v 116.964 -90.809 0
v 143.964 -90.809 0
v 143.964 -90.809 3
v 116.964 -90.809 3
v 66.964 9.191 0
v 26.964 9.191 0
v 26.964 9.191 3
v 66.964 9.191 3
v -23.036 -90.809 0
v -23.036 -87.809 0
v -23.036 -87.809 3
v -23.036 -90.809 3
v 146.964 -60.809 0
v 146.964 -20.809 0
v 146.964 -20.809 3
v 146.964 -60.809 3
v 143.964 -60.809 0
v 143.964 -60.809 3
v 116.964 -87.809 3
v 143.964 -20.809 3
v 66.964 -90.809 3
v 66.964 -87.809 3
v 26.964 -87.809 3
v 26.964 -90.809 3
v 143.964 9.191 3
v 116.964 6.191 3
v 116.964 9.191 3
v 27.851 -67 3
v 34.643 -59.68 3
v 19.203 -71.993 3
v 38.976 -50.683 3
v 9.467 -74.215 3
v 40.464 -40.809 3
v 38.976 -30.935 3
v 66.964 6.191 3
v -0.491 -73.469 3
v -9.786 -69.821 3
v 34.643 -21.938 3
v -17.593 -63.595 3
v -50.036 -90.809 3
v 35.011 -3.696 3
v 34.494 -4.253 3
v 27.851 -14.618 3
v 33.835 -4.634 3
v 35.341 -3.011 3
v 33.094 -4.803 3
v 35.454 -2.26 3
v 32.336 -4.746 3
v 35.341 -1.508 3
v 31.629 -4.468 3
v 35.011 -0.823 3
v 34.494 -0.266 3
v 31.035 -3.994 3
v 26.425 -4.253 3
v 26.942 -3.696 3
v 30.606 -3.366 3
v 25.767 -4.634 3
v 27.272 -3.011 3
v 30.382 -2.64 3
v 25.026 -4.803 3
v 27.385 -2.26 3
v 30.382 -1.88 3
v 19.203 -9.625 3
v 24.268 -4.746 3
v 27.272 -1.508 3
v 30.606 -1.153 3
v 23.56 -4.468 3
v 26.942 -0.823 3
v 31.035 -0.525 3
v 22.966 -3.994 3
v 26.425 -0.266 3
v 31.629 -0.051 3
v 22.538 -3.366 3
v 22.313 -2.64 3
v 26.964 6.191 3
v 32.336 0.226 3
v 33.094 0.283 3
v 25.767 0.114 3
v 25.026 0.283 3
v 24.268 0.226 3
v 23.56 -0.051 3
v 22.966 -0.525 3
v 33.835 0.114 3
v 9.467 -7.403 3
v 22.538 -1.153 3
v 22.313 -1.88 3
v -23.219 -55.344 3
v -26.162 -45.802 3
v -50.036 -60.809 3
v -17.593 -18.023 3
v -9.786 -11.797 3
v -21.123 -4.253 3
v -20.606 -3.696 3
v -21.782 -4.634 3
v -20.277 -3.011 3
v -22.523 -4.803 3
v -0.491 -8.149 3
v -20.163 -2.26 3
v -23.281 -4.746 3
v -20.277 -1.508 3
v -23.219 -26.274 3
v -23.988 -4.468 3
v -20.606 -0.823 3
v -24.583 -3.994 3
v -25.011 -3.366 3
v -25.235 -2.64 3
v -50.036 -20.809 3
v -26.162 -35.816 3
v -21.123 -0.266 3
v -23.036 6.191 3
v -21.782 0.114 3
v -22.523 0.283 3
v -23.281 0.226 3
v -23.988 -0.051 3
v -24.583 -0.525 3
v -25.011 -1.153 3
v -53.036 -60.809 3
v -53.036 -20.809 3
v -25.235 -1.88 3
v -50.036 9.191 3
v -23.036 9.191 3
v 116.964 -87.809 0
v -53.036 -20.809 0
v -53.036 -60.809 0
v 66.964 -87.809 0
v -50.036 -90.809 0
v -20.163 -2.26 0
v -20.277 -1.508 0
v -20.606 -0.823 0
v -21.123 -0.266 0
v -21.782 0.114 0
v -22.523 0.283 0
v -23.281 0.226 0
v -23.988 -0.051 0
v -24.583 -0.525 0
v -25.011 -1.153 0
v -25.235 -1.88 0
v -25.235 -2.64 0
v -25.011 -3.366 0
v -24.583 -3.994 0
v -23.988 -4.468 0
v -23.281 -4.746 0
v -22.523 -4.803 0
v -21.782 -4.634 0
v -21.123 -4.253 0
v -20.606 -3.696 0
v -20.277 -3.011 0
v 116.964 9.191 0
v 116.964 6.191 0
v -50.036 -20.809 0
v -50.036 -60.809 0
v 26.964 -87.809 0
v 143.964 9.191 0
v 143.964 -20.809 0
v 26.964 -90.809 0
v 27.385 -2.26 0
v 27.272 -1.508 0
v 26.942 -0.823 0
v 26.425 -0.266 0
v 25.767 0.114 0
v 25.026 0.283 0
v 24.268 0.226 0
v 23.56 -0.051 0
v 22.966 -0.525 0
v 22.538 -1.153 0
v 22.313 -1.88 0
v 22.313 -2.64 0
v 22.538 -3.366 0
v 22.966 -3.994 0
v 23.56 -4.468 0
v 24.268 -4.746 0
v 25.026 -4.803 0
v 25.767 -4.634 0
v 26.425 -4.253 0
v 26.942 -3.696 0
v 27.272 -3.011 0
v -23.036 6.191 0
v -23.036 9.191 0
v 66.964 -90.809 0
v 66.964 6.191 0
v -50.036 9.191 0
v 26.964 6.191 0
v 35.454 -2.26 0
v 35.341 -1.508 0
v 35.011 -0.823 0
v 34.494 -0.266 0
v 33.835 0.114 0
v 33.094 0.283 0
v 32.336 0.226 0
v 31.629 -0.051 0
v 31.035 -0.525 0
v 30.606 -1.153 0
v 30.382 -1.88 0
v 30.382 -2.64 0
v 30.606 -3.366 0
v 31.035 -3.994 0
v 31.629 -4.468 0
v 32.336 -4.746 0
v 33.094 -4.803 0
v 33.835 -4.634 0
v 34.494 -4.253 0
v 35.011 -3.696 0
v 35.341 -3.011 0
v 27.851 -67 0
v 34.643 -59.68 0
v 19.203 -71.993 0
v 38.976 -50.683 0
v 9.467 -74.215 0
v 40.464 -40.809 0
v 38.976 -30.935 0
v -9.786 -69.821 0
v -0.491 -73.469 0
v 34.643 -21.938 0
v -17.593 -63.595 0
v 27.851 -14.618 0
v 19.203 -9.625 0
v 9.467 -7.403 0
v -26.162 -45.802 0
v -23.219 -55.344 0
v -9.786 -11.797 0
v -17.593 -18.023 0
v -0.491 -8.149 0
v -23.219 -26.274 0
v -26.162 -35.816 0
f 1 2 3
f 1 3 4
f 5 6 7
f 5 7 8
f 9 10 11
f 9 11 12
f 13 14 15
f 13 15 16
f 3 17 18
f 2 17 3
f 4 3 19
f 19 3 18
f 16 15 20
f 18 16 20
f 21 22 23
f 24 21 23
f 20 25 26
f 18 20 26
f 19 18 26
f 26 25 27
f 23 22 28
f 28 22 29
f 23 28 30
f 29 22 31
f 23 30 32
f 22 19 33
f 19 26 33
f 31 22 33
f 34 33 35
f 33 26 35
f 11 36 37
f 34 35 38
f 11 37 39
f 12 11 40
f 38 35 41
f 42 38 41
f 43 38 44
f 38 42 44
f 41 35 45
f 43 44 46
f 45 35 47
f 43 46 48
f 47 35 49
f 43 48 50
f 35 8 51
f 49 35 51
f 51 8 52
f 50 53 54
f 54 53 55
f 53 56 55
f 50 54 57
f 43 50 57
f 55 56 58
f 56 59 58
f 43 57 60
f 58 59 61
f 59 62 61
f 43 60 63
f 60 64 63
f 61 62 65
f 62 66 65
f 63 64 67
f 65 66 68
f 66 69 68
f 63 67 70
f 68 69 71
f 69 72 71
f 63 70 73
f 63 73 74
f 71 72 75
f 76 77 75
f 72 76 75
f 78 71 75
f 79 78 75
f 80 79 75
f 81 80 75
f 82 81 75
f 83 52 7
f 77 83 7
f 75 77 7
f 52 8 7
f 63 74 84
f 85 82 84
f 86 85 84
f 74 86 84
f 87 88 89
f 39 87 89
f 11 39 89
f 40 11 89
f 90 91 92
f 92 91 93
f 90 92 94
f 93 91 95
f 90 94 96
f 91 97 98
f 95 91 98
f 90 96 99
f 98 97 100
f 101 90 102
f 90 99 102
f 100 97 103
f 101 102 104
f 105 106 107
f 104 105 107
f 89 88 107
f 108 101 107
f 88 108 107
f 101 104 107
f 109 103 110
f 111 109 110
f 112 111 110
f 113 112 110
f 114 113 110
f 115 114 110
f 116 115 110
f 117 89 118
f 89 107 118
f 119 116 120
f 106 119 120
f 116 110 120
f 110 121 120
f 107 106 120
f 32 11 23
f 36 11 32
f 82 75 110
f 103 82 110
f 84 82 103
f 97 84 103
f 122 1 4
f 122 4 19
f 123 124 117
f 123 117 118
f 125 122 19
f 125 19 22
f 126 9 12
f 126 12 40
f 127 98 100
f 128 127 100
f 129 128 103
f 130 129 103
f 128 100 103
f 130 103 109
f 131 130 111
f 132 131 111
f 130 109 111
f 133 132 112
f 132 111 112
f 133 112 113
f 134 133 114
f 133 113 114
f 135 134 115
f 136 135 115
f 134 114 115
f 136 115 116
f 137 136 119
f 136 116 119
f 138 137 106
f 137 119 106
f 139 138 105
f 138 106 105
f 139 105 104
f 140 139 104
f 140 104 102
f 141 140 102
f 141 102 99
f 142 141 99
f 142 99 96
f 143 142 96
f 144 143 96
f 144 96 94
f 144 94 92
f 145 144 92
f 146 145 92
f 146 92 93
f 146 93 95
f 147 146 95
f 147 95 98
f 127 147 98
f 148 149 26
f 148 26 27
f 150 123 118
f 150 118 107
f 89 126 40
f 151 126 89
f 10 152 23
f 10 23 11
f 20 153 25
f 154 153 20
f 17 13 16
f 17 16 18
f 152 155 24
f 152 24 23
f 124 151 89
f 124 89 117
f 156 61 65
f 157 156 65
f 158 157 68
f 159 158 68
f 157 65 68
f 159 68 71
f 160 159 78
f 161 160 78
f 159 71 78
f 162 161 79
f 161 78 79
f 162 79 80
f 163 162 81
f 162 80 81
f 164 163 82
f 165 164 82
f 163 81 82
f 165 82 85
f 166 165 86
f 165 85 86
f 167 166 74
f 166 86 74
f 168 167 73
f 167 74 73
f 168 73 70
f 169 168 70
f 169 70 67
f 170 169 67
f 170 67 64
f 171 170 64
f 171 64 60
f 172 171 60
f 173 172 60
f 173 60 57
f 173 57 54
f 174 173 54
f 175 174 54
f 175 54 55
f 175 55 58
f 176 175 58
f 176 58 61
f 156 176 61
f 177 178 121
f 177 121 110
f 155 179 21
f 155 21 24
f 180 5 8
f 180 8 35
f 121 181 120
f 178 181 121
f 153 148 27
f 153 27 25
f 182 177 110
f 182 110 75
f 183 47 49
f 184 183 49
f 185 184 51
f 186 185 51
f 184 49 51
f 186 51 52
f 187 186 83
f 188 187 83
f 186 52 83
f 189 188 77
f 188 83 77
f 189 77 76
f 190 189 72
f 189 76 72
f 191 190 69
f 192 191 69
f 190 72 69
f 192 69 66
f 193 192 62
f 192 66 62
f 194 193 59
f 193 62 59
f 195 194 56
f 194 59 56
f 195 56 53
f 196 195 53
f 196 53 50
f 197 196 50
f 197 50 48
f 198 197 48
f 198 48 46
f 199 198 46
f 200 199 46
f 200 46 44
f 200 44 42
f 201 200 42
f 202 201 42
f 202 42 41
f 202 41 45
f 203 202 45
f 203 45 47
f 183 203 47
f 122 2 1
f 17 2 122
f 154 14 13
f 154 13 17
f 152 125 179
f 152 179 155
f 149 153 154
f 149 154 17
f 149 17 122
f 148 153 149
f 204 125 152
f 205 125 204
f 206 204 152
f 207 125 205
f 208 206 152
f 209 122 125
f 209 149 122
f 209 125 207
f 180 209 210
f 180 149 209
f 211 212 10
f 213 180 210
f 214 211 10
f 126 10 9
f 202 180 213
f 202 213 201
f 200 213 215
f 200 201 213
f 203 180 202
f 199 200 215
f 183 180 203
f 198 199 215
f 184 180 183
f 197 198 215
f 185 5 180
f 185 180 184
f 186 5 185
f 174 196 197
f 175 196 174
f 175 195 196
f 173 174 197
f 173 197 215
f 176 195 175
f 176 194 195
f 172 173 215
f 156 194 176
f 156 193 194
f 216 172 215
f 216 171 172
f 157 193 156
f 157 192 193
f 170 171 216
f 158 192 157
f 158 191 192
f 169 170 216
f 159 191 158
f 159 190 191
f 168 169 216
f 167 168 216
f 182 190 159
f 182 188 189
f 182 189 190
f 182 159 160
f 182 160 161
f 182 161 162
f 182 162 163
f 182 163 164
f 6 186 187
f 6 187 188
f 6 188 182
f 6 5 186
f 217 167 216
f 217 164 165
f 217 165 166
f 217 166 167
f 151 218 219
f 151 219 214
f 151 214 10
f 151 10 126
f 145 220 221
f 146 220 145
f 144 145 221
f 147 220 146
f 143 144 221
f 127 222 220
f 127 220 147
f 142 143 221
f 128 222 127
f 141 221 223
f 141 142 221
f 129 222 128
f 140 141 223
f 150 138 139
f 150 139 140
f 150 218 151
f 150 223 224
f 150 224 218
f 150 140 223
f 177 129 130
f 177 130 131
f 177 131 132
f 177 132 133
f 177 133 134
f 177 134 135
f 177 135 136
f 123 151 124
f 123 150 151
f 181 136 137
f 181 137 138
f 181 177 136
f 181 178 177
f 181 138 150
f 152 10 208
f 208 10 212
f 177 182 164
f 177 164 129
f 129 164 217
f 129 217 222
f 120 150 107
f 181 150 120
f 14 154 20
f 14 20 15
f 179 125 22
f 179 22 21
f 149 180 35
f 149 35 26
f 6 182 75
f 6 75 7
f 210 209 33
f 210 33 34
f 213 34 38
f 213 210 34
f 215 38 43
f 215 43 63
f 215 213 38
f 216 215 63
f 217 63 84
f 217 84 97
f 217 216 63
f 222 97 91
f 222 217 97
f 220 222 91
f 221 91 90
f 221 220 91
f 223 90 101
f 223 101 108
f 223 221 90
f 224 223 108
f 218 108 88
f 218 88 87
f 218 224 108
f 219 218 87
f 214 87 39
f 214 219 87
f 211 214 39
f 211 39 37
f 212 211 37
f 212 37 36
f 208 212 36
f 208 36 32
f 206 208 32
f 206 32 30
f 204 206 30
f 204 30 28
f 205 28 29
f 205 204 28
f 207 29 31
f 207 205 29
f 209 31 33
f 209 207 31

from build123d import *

# Parameters (mm, degrees)
ESQUISSE2_R             = 33.5
BOSS_EXTRU_1_DEPTH      = 3
ENL_V_MAT_EXTRU_1_REACH = 174.782
ESQUISSE3_R             = 2.55


with BuildPart() as part:
    # Esquisse2 → Boss.-Extru.1 (new body)
    with BuildSketch(Plane.XY):
        Polygon((26.963895135, 9.191113465), (66.963895135, 9.191113465), (66.963895135, 6.191113465), (116.963895135, 6.191113465), (116.963895135, 9.191113465), (143.963895135, 9.191113465), (143.963895135, -20.808886535), (146.963895135, -20.808886535), (146.963895135, -60.808886535), (143.963895135, -60.808886535), (143.963895135, -90.808886535), (116.963895135, -90.808886535), (116.963895135, -87.808886535), (66.963895135, -87.808886535), (66.963895135, -90.808886535), (26.963895135, -90.808886535), (26.963895135, -87.808886535), (-23.036104865, -87.808886535), (-23.036104865, -90.808886535), (-50.036104865, -90.808886535), (-50.036104865, -60.808886535), (-53.036104865, -60.808886535), (-53.036104865, -20.808886535), (-50.036104865, -20.808886535), (-50.036104865, 9.191113465), (-23.036104865, 9.191113465), (-23.036104865, 6.191113465), (26.963895135, 6.191113465), align=None)
        with Locations((6.963895135, -40.808886535)):
            Circle(ESQUISSE2_R, mode=Mode.SUBTRACT)
    extrude(amount=BOSS_EXTRU_1_DEPTH)

    # Esquisse3 → Enlèv. mat.-Extru.1 (cut, up to next)
    with BuildSketch(Plane.XY.offset(3), mode=Mode.PRIVATE) as enl_v_mat_extru_1_sk1:
        with Locations((24.835002906, -2.259814335)):
            Circle(ESQUISSE3_R)
    enl_v_mat_extru_1_tool1 = extrude(enl_v_mat_extru_1_sk1.sketch, amount=-ENL_V_MAT_EXTRU_1_REACH, mode=Mode.PRIVATE) & part.part
    # Esquisse3 → Enlèv. mat.-Extru.1 (cut, up to next)
    with BuildSketch(Plane.XY.offset(3), mode=Mode.PRIVATE) as enl_v_mat_extru_1_sk2:
        with Locations((32.903794199, -2.259814335)):
            Circle(ESQUISSE3_R)
    enl_v_mat_extru_1_tool2 = extrude(enl_v_mat_extru_1_sk2.sketch, amount=-ENL_V_MAT_EXTRU_1_REACH, mode=Mode.PRIVATE) & part.part
    # Esquisse3 → Enlèv. mat.-Extru.1 (cut, up to next)
    with BuildSketch(Plane.XY.offset(3), mode=Mode.PRIVATE) as enl_v_mat_extru_1_sk3:
        with Locations((-22.713231498, -2.259814335)):
            Circle(ESQUISSE3_R)
    enl_v_mat_extru_1_tool3 = extrude(enl_v_mat_extru_1_sk3.sketch, amount=-ENL_V_MAT_EXTRU_1_REACH, mode=Mode.PRIVATE) & part.part
    add(enl_v_mat_extru_1_tool1.solids().sort_by_distance((24.835003, -2.259814, 3))[0], mode=Mode.SUBTRACT)
    add(enl_v_mat_extru_1_tool2.solids().sort_by_distance((32.903794, -2.259814, 3))[0], mode=Mode.SUBTRACT)
    add(enl_v_mat_extru_1_tool3.solids().sort_by_distance((-22.713231, -2.259814, 3))[0], mode=Mode.SUBTRACT)


solid = part.part
